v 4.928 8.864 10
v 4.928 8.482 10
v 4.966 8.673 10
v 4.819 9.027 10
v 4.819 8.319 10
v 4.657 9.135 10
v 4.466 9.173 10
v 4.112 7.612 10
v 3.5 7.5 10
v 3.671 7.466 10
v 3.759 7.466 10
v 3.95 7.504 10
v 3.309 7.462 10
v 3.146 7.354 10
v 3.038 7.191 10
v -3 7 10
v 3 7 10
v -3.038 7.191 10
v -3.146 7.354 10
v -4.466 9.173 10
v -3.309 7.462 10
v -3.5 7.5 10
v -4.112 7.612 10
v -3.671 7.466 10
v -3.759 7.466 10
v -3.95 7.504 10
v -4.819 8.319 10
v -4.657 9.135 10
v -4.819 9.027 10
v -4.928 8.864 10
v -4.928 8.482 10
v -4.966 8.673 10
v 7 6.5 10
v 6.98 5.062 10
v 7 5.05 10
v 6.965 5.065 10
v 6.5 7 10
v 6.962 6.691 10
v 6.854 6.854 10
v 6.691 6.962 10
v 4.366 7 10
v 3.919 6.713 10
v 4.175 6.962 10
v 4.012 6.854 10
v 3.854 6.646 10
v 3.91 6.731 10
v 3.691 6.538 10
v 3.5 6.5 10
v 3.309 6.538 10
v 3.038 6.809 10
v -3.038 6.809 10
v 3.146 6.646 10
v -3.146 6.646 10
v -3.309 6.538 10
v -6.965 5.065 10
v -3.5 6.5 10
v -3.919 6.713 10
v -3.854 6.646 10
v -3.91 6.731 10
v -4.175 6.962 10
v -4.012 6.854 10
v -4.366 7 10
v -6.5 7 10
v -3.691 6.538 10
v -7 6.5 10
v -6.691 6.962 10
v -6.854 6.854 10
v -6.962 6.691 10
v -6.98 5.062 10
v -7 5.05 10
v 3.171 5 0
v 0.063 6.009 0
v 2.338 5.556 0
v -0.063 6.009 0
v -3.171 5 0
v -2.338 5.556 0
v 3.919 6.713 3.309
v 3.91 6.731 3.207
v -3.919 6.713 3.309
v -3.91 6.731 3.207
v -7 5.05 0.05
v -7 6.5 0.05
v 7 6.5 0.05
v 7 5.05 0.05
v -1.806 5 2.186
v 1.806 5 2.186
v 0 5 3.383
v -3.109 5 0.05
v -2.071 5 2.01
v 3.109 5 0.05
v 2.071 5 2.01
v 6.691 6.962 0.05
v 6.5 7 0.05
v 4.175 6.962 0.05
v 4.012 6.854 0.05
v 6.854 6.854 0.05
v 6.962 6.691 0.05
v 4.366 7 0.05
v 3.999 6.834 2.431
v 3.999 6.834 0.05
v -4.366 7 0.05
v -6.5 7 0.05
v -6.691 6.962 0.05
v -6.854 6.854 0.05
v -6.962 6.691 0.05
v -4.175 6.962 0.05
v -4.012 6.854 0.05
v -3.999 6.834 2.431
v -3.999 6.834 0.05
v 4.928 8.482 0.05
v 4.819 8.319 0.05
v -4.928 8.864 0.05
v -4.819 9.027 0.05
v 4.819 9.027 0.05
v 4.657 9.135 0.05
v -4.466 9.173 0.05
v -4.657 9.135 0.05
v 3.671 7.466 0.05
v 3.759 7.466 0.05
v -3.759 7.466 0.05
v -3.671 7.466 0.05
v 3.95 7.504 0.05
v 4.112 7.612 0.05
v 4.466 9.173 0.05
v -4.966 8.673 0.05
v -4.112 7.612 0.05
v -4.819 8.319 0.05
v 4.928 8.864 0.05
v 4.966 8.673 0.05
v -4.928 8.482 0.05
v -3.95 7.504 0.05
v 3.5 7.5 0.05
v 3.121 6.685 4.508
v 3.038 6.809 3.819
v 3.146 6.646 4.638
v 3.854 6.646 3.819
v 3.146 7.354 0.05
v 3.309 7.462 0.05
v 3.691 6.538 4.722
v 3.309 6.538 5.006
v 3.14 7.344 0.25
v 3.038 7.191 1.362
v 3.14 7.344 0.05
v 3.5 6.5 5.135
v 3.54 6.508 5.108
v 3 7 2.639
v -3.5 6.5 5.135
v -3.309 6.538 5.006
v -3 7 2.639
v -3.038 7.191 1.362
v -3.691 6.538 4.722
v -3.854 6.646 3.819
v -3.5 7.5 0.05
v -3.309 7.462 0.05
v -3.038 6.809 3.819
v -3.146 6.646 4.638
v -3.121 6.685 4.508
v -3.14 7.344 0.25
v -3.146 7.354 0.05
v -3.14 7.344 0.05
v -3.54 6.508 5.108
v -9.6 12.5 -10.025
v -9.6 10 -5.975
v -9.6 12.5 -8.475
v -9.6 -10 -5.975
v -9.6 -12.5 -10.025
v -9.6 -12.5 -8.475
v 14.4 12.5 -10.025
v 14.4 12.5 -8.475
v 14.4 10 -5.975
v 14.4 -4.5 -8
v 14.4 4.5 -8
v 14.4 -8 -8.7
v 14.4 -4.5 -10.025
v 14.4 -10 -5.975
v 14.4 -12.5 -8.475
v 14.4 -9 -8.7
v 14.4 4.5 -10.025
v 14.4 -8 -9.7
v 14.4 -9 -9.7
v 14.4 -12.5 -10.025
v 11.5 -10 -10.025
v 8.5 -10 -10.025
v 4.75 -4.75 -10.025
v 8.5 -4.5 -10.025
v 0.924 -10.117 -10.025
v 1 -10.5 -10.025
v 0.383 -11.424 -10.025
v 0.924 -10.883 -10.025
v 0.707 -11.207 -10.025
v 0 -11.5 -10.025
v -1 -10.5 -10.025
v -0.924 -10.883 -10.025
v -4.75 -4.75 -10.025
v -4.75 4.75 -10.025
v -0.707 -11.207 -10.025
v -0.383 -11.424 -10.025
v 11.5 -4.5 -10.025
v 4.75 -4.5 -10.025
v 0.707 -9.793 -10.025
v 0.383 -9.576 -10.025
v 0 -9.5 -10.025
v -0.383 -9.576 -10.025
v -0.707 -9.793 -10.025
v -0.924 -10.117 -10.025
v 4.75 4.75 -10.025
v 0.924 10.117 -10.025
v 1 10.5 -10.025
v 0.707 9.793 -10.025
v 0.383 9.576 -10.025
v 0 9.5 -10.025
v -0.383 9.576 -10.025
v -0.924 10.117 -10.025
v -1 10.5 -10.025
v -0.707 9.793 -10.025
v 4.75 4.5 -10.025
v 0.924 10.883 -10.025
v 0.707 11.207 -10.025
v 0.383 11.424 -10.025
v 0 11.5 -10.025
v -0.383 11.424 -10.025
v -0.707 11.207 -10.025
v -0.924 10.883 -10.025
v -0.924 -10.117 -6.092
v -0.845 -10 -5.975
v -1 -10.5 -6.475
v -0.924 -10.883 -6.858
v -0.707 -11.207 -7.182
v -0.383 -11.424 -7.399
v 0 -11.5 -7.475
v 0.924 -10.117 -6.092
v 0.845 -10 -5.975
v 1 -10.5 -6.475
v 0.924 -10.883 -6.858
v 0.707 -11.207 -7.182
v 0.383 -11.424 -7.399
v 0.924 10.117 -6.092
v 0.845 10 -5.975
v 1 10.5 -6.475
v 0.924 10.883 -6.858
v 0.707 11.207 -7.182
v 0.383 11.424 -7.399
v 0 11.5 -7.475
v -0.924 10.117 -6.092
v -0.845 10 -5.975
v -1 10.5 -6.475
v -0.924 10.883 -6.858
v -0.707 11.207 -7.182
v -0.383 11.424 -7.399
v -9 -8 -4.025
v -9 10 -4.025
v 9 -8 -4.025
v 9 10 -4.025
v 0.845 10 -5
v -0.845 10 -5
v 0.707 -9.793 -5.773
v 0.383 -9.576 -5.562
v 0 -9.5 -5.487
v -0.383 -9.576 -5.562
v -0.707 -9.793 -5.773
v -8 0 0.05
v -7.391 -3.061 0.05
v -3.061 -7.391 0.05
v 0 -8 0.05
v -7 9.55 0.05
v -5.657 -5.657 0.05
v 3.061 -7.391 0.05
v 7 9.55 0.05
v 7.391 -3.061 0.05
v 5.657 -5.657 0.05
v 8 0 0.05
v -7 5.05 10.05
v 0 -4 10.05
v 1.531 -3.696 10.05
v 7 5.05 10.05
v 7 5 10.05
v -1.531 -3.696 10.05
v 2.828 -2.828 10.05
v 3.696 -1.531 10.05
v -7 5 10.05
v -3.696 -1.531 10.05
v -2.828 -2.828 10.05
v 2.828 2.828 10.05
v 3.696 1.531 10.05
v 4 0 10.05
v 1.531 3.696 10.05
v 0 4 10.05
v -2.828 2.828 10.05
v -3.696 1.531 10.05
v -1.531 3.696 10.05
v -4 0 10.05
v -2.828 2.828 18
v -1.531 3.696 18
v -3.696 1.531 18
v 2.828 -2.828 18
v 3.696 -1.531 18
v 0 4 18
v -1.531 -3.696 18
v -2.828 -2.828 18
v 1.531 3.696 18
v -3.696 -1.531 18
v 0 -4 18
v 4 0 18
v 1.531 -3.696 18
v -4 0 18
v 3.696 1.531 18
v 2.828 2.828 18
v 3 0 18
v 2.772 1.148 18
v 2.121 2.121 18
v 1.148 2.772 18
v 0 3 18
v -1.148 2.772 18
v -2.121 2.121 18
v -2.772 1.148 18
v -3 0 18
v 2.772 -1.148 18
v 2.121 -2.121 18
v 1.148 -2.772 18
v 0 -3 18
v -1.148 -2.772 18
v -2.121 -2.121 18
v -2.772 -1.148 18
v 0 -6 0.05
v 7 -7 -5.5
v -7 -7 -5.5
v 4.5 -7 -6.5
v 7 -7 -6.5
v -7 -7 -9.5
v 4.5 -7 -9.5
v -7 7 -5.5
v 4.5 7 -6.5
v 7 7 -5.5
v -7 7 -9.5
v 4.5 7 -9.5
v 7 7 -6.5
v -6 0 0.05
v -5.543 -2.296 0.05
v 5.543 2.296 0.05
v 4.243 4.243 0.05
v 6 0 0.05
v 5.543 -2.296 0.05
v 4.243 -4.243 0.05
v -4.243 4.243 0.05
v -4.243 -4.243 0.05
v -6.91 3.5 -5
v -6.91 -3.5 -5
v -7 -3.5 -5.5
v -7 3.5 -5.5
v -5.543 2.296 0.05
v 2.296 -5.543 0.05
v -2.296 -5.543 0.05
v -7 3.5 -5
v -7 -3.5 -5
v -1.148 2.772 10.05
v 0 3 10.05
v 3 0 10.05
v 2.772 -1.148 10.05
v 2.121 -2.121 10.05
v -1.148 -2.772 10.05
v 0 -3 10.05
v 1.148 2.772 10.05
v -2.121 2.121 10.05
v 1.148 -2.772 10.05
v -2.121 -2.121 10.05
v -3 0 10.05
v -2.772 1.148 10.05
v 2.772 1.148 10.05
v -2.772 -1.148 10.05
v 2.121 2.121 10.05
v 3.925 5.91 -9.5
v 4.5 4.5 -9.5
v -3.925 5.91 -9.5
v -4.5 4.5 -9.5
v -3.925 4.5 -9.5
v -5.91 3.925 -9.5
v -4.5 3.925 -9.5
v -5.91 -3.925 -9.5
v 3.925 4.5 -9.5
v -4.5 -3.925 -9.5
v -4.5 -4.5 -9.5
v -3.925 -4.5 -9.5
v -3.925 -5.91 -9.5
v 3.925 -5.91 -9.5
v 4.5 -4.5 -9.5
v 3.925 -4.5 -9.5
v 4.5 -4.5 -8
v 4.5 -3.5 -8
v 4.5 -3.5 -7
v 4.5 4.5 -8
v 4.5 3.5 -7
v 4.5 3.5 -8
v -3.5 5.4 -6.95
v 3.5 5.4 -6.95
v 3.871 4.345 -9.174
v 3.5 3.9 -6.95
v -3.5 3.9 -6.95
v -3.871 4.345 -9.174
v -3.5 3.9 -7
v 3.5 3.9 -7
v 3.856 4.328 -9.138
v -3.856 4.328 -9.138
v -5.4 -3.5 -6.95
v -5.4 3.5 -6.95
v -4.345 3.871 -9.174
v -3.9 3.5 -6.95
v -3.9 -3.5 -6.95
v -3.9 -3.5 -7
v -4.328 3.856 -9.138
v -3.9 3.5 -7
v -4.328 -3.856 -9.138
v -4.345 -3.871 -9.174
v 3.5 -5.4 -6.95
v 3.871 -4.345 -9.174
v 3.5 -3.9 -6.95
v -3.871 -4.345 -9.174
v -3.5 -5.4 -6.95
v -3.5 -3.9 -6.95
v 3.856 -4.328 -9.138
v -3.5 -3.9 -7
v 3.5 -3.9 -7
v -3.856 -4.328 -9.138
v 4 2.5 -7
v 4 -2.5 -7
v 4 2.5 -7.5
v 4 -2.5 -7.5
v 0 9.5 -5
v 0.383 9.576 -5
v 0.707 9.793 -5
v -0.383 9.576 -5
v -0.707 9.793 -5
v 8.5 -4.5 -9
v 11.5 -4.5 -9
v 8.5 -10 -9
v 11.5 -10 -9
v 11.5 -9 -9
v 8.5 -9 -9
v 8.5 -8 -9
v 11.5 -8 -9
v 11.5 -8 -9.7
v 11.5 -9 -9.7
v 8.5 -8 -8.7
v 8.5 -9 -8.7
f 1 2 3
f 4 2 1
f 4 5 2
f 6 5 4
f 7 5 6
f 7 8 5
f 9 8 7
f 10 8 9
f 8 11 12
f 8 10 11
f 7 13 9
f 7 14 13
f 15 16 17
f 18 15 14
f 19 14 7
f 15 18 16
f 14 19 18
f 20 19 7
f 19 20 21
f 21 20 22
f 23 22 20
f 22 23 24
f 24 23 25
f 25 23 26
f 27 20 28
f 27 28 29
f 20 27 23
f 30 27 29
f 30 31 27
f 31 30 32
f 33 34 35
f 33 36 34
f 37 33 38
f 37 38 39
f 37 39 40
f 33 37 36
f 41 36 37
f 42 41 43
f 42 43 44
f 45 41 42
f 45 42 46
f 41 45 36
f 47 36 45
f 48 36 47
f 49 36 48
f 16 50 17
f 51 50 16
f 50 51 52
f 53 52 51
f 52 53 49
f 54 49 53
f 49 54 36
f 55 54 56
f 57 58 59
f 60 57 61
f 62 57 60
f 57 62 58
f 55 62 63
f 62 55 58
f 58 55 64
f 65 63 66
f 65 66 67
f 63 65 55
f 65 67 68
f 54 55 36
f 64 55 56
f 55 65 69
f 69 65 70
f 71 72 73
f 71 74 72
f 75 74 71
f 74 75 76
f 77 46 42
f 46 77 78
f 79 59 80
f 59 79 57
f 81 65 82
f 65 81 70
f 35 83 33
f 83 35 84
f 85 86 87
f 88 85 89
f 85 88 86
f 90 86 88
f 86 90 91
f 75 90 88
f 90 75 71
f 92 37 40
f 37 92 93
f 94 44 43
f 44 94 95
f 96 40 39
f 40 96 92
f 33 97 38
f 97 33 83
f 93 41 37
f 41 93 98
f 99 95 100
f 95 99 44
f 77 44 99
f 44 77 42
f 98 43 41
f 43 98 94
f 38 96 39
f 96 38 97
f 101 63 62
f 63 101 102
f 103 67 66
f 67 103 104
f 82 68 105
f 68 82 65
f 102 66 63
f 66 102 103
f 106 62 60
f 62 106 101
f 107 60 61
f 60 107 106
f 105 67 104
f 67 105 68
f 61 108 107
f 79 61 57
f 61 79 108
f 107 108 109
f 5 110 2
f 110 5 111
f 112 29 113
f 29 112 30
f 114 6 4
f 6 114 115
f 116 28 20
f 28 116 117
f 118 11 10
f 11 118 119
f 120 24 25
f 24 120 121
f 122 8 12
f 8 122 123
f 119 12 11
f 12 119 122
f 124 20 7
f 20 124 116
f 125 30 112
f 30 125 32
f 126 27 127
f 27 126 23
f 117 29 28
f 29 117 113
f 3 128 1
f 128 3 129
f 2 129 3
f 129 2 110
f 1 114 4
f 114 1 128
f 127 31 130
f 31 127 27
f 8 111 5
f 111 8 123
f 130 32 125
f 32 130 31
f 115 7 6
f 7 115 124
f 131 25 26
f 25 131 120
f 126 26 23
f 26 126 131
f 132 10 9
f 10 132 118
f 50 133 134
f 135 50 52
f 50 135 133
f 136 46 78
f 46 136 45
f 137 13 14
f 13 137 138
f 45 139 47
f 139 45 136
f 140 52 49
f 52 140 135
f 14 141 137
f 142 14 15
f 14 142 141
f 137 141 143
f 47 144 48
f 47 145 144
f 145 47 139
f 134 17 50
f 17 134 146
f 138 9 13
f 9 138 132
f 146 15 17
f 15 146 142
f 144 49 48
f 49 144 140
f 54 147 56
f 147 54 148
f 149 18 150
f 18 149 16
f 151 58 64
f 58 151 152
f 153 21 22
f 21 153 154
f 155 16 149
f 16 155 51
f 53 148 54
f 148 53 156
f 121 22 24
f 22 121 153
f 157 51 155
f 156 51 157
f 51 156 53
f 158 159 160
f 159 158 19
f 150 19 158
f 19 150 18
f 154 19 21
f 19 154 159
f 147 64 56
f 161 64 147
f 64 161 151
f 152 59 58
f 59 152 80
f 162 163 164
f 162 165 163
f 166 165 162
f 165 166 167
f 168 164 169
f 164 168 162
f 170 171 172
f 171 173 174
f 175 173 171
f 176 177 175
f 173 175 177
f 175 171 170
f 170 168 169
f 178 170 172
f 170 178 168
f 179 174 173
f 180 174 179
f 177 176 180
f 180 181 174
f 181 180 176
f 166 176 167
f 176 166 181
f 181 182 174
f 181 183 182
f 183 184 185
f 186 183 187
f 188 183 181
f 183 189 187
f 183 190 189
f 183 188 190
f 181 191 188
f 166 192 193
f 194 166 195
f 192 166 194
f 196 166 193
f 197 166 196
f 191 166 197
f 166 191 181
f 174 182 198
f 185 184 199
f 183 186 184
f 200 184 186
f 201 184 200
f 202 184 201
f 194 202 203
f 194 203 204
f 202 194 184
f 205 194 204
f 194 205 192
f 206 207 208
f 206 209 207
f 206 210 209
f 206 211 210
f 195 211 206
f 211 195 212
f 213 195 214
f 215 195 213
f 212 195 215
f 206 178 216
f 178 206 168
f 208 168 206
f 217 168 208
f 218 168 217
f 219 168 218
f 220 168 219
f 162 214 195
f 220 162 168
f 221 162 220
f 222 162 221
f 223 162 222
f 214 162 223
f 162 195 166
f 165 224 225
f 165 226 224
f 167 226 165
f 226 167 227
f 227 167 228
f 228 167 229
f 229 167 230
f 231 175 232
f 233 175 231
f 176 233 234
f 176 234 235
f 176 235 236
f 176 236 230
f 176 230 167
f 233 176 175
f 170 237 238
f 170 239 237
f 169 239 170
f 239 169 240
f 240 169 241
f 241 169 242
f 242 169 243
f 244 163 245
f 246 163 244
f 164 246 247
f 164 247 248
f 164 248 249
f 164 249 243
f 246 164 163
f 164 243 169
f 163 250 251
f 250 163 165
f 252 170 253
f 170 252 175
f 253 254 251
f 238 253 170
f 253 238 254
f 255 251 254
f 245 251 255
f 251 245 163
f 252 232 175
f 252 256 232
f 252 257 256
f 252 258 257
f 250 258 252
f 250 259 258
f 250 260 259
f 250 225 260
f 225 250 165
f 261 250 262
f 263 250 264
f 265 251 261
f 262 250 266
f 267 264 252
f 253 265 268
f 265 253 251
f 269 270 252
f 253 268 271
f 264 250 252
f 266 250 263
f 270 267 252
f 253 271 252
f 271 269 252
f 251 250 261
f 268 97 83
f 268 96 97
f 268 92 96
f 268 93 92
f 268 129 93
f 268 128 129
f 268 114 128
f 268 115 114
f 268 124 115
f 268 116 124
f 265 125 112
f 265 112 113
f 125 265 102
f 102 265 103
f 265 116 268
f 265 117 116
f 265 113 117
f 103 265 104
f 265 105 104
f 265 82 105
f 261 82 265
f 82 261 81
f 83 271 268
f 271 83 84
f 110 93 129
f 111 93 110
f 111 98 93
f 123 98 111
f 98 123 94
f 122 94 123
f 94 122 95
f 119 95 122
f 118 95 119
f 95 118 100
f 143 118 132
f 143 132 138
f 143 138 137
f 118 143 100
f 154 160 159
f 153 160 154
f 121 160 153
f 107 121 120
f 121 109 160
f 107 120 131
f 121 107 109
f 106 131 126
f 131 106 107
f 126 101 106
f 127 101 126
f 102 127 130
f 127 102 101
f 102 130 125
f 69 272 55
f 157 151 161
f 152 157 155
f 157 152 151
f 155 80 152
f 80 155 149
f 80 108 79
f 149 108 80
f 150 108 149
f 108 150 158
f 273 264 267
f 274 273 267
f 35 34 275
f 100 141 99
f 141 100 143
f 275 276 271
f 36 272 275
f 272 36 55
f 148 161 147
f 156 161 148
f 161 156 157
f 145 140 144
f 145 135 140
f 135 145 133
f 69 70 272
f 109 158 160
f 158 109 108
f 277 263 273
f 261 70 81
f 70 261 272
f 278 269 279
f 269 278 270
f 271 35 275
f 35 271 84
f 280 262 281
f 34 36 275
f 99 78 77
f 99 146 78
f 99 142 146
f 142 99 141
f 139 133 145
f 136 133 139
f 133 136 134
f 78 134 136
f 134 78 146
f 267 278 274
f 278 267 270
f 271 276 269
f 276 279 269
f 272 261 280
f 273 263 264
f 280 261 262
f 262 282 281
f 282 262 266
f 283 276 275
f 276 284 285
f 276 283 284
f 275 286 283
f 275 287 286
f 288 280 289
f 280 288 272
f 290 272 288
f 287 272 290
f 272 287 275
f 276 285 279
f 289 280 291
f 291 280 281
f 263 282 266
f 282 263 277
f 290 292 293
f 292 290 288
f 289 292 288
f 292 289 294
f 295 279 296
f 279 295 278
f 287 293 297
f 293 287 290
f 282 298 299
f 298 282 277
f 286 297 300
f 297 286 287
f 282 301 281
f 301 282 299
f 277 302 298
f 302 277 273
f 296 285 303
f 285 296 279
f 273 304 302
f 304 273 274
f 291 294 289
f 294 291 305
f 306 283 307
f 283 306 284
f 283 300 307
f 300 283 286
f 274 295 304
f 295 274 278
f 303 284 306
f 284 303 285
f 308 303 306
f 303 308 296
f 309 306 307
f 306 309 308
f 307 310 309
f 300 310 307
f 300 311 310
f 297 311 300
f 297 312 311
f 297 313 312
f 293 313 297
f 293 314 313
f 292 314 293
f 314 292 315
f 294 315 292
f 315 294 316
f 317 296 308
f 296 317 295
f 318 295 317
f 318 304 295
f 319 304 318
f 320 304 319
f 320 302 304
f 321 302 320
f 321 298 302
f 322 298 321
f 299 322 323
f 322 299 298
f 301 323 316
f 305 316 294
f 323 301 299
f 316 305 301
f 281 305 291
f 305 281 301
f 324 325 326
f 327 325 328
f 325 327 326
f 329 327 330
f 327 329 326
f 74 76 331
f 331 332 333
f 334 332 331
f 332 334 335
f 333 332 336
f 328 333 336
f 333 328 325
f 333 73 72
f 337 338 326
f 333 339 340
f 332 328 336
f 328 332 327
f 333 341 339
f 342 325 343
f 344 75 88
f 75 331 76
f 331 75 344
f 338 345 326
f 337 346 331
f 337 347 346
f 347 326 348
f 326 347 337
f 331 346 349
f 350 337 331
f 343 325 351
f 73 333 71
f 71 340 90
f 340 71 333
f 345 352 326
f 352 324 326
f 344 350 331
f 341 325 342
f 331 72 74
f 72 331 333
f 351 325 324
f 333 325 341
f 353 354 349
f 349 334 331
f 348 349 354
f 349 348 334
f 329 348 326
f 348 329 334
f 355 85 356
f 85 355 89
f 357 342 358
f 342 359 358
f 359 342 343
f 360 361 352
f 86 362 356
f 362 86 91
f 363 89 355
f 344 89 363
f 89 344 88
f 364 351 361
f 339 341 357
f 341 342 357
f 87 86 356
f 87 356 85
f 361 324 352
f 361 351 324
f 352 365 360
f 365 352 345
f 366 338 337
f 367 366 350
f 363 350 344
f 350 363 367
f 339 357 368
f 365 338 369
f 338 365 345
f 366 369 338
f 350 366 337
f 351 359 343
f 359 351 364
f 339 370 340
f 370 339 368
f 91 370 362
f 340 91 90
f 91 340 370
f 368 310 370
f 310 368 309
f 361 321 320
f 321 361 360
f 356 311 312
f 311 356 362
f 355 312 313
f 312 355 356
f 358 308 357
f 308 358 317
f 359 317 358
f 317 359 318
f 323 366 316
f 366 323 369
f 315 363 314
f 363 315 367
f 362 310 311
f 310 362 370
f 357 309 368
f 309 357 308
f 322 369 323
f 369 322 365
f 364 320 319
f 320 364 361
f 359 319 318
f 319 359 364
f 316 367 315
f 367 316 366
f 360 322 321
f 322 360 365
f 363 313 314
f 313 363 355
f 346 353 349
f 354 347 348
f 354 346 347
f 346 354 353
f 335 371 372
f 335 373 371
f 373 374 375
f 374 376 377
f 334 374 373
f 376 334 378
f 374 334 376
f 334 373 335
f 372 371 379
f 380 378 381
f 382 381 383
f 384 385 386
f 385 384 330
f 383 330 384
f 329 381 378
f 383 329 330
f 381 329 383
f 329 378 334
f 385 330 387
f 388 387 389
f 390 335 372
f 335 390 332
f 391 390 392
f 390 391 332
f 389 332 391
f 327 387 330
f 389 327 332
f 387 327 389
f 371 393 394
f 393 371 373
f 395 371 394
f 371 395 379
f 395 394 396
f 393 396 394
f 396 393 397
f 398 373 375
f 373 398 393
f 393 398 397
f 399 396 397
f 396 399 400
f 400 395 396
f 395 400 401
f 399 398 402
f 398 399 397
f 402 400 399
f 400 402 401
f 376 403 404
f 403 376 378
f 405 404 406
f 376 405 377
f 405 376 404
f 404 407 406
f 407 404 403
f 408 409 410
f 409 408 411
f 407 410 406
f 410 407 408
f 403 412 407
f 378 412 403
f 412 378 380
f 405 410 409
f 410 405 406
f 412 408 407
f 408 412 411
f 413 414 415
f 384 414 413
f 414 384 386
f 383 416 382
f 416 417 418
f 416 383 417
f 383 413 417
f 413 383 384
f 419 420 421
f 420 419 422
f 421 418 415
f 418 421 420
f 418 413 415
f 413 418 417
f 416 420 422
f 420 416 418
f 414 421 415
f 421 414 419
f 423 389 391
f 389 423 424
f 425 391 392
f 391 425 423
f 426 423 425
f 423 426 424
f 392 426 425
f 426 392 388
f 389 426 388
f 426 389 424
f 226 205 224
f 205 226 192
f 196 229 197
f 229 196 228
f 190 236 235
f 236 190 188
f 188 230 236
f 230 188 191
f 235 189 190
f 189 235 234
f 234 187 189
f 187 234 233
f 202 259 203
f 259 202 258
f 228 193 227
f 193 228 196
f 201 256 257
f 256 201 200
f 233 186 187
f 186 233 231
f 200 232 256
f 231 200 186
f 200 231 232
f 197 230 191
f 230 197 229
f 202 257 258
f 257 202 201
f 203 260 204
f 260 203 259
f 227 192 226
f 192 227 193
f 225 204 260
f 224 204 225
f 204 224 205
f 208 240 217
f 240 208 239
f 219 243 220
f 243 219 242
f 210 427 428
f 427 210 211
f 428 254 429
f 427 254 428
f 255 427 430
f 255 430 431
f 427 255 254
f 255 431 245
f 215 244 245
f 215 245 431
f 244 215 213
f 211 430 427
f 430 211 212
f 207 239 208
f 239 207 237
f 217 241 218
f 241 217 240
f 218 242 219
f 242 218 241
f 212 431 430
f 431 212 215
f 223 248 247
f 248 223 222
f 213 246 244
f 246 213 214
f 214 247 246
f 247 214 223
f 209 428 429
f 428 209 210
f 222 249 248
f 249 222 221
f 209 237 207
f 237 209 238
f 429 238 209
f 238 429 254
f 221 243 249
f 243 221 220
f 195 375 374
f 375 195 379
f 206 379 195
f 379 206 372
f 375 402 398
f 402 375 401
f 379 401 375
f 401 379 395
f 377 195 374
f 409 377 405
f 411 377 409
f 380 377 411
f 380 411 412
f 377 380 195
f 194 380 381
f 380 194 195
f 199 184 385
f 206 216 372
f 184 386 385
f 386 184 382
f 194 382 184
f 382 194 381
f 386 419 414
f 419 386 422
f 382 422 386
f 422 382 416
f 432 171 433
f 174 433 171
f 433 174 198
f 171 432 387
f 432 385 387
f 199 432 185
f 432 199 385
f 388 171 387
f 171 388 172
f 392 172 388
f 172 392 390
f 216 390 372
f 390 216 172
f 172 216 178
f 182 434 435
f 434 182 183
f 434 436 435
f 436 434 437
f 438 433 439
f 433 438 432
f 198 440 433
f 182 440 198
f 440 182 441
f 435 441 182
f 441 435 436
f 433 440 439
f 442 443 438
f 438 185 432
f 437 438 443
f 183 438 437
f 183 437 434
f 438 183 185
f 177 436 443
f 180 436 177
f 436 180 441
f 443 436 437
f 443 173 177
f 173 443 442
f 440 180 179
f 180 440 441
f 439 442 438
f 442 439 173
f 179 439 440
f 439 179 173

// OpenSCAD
// file: picam_push_fit.scad
use <utilities.scad>;


//outer_r=8.5;   //square side length
//f=0.5; //feather amount
d=0.05; //small distance!


module camera_bits(){
	union(){
		translate([0,6.5+5,0]) cube([8.5,10,3],center=true);
		translate([7,10,0]) cube([4,3,2],center=true);
	}
}

module picam_push_fit(){
    // This uses four slightly flexible fingers to grip the
    // camera module.  It's designed to be subtracted from a
    // larger shape, and needs space above it.
    // it's often a bit too stiff, and tends to rotate the
    // camera slightly.  v2 is better (see below).
	assign(r=8-0.25) //un-flexed side length of camera box
	assign(finger_w=2) //width of flexure "fingers"
	assign(chamfer=0.75) //How much to shrink the bottom layer
	union(){
		//very tight cut-out for camera
		sequential_hull(){
			cube([r+chamfer*2,r+chamfer*2,d],center=true);
			cube([r,r,chamfer*2],center=true);
			cube([r,r,40],center=true);
		}
		for(a=[0:90:360]) rotate(a){
			translate([0,r/2-1,0.48]) cube([r/2+finger_w+1,1,20]);
			translate([r/2+finger_w,-r/2,-d]) cube([1,r,20]);
		}
		camera_bits();

		//screw holes for safety (M2 "threaded")
		reflect([1,0,0]) translate([21/2,0,0]) cylinder(r=1,h=10);
	}
}



module picam_push_fit_2( beam_length=15){
    // This module is designed to be subtracted from the bottom of a shape.
    // The z=0 plane should be the print bed.
    // It includes cut-outs for the components on the PCB and also a push-fit hole
    // for the camera module.  This uses flexible "fingers" to grip the camera firmly
    // but gently.  Just push to insert, and wiggle to remove.  You may find popping 
    // off the brown ribbon cable and removing the PCB first helps when extracting
    // the camera module again.
    camera = [8,8,3]; //size of camera box
	cw = camera[0]+1; //side length of camera box at bottom (slightly larger)
	finger_w = 1.5; //width of flexure "fingers"
	flex_l = 1; //width of flexible part
    hole_r = camera[0]/2-0.5;
	union(){
		//cut-out for camera
        hull(){
            translate([0,0,-d]) cube([cw+0.5,cw+0.5,d],center=true); //hole for camera
            translate([0,0,1]) cube([cw-0.5,cw-0.5,d],center=true); //hole for camera
        }
        rotate(180/16) cylinder(r=hole_r,h=20,center=true,$fn=16); //hole for light
        
        //looser cut-out for camera, with gripping "fingers" on 3 sides
        difference(){
            //cut-out big enough to include gripping fingers
            intersection(){
                translate([-cw/2-finger_w-flex_l,-cw/2-finger_w-flex_l,0.5])
                    cube([cw+2*finger_w+2*flex_l,
                        cw+finger_w+flex_l,
                        999]);
                //build up the roof gradually so we get a nice hole
                rotate(90) translate([0,0,camera[2]+1.5]) hole_from_bottom(r=hole_r,base_w=cw+2*finger_w+2*flex_l,h=beam_length - camera[2]-1.5);
            }
                
            //gripping "fingers" (NB we subtract these from the cut-out)
            for(a=[90:90:270]) rotate(a) hull(){
                translate([-cw/2+0.5,cw/2,0]) cube([cw-1,finger_w,d]);
                translate([-cw/2+1,camera[0]/2-0.1,camera[2]]) cube([cw-2,finger_w,d]);
            }
            //there's no finger on the top, so add a dimple on the fourth side
            hull(){
                translate([-cw/2+1,cw/2,2]) cube([cw-2,d,camera[2]-2]);
                translate([-cw/2+2,camera[1]/2,camera[2]-0.5]) cube([cw-4,d,0.5]);
            }
		}
        
		//ribbon cable at top of camera
        translate([0,(9.5+5)/2+cw/2-d,0]) cube([cw,9.5+5,4],center=true);
        //resistor/LED
		translate([7,10,0]) cube([4+2,3,2],center=true);
        translate([7+1,8.5,0.3]) cube([1,13,1]); //channel so we can see the LED
                //NB the LED channel is deliberately high to aid adhesion

		//screw holes for safety (M2 "threaded")
		reflect([1,0,0]) translate([21/2,0,0]) cylinder(r=1,h=10,center=true);
	}
}

//difference(){
//    translate([-12.5,-12+2.4,0]) cube([25,24,6]);
//    picam_push_fit_2();
//}

module picam_pcb_bottom(){
    // This is an approximate model of the pi camera PCB for the purposes of making
    // a slide-on cover.  NB z=0 is the bottom of the PCB, which is nominally 1mm thick.
    pcb = [25+0.5,24+0.5,1+0.3];
    socket = [pcb[0],6.0+0.5,2.7];
    components = [pcb[0]-3*2, pcb[1]-1-socket[1], 2];
    translate([0,2.4,0]) union(){ //NB the camera bit isn't centred!
        translate([0,0,pcb[2]/2]) cube(pcb,center=true); //the PCB
        translate([-components[0]/2,-pcb[1]/2+socket[1],-components[2]+d]) cube(components); //the little components
        //the ribbon cable socket
        translate([-socket[0]/2,-pcb[1]/2,-socket[2]+d]) cube(socket); //the ribbon cable socket
        translate([-components[0]/2,-pcb[1]/2,-0.5]) cube([components[0],socket[1]+0.5,0.5+d]); //pins protrude slightly further
        
        //mounting screws (NB could be extruded in -y so the cover can slide on)
        reflect([1,0,0]) mirror([0,0,1]) translate([21/2,-2.4,-d]){
            cylinder(r=2.5,h=10);
            cylinder(r=1.5,h=15,center=true); //screw might poke through the top...
        }
    }
}
translate([0,0,-1]) picam_pcb_bottom();
// main file
use <utilities.scad>;
use <./picam_push_fit.scad>;
$fn=16;
d=0.05;

clip_y = 7;  //position of dovetail (normal microscope)
//clip_y = 10; //position of dovetail (big-stage version)
clip_w = 14; //external width of clip for dovetail
clip_h = 10; //height of dovetail
tube_h = 8; //height of tube that meshes with objective
beam_r = 3; //radius of beam (must be > camera diagonal/2)
bottom = -10;

//the dovetail should sit at ([0,-leg_r-2,sample_z+5])
//the LED should sit at ([0,0,sample_z+30])
module clip_tooth(h){
	intersection(){
		cube([999,999,h]);
		rotate(-45) cube([1,1,1]*999*2);
	}
}
module dovetail(w=10,dt=1.5,h=10,t=2){
    // This produces a vertical dovetail (doesn't slide without
    // considerable force - it's designed to stay put!)
    // w is the dovetail width - i.e. the width between the
    //   insides of the flexible struts on the holder. The
    //   actual width of the part is less than this.
    // dt is the size of the dovetail "teeth"
    // h is the height of the structure
    // t is the thickness of the back of the dovetail.
    // y=0 is the plane of the flat part of the dovetail, i.e.
    // the part that makes contact with the front of the clip.
	assign(r=0.5,corner=[w/2-dt,0,0]) difference(){
		union(){
			sequential_hull(){
				translate([-w/2+dt,r,0]) cube([w-2*dt,d,h]);
				translate([-w/2+dt-r,-r,0]) cube([w-2*dt+2*r,d,h]);
				translate([-w/2,-r,0]) cube([w,d,h]);
				translate([-w/2-t,-t,0]) cube([w+2*t,t-r,h]);
				echo("width of dovetail back is", w-2*dt+2*(sqrt(3)*r+1+r));
			}
			difference(){
				union(){
					reflect([1,0,0]) hull(){
						translate(corner+[sqrt(3)*r,-r,0]) cylinder(r=r,h=h);	
						translate([w/2+t-r,-r,0]) cylinder(r=r,h=h);	
				}
					hull() reflect([1,0,0]) translate(corner) rotate(45) translate([sqrt(3)*r,r,0]) repeat([1,0,0],2) cylinder(r=r,h=h);
				}
			}
		}
		reflect([1,0,0]) translate(corner) cylinder(r=r,h=3*h,center=true);
		reflect([1,0,0]) translate(corner+[0,0,-1]) clip_tooth(999);
	}
}

module picam_mount(){
	union(){
		translate([0,clip_y,0]) dovetail(w=clip_w-4,h=clip_h);
		difference(){ //barrel/body
			sequential_hull(){
                translate([2.4,0,bottom]) cube([24,25,d],center=true);
                translate([2.4,0,bottom+1.5]) cube([24,25,d],center=true);
                translate([2.4,0,bottom+4]) cube([24,25-5,d],center=true);
				translate([0,1,bottom+6-d]) cube([18,18,d],center=true);
				union(){
					translate([-clip_w/2,clip_y+2.5,0]) cube([clip_w,d,d]);
					cylinder(r=8,h=d);
				}
				union(){
					translate([-clip_w/2,clip_y-2,0]) cube([clip_w,d,d]);
					cylinder(r=8,h=d);
				}
				translate([0,0,clip_h]) union(){
					translate([-clip_w/2,clip_y-2,0]) cube([clip_w,d,d]);
					cylinder(r=beam_r+1,h=d);
				}
				translate([0,0,clip_h]) cylinder(r=beam_r+1,h=d);
				translate([0,0,clip_h]) cylinder(r=beam_r+1,h=tube_h);
			}
            //beam path
			sequential_hull(){
				translate([-7,-7,bottom+3.5]) cube([14,14,1]);
				cylinder(r=6,h=d);
				cylinder(r=beam_r,h=clip_h+d);
				cylinder(r=beam_r,h=clip_h+tube_h+d);
			}
            //camera
            rotate(-90) translate([0,0,bottom]) picam_push_fit_2(beam_length=8);
		}
	}
}

picam_mount();

/////////// Cover for camera board //////////////
module picam_cover(){
    // A cover for the camera PCB, slips over the bottom of the camera
    // mount.
    start_y=-12+2.4;//-3.25;
    l=-start_y+12+2.4; //we start just after the socket and finish at 
    //the end of the board - this is that distance!
    difference(){
        union(){
            //base
            translate([-15,start_y,-4.3]) cube([25+5,l,4.3+d]);
            //grippers
            reflect([1,0,0]) translate([-15,start_y,0]){
                cube([2,l,4.5-d]);
                hull(){
                    translate([0,0,1.5]) cube([2,l,3]);
                    translate([0,0,4]) cube([2+2.5,l,0.5]);
                }
            }
        }
        translate([0,0,-1]) picam_pcb_bottom();
        //chamfer the connector edge for ease of access
        translate([-999,start_y,0]) rotate([-135,0,0]) cube([9999,999,999]);
    }
} 

//picam_cover();
